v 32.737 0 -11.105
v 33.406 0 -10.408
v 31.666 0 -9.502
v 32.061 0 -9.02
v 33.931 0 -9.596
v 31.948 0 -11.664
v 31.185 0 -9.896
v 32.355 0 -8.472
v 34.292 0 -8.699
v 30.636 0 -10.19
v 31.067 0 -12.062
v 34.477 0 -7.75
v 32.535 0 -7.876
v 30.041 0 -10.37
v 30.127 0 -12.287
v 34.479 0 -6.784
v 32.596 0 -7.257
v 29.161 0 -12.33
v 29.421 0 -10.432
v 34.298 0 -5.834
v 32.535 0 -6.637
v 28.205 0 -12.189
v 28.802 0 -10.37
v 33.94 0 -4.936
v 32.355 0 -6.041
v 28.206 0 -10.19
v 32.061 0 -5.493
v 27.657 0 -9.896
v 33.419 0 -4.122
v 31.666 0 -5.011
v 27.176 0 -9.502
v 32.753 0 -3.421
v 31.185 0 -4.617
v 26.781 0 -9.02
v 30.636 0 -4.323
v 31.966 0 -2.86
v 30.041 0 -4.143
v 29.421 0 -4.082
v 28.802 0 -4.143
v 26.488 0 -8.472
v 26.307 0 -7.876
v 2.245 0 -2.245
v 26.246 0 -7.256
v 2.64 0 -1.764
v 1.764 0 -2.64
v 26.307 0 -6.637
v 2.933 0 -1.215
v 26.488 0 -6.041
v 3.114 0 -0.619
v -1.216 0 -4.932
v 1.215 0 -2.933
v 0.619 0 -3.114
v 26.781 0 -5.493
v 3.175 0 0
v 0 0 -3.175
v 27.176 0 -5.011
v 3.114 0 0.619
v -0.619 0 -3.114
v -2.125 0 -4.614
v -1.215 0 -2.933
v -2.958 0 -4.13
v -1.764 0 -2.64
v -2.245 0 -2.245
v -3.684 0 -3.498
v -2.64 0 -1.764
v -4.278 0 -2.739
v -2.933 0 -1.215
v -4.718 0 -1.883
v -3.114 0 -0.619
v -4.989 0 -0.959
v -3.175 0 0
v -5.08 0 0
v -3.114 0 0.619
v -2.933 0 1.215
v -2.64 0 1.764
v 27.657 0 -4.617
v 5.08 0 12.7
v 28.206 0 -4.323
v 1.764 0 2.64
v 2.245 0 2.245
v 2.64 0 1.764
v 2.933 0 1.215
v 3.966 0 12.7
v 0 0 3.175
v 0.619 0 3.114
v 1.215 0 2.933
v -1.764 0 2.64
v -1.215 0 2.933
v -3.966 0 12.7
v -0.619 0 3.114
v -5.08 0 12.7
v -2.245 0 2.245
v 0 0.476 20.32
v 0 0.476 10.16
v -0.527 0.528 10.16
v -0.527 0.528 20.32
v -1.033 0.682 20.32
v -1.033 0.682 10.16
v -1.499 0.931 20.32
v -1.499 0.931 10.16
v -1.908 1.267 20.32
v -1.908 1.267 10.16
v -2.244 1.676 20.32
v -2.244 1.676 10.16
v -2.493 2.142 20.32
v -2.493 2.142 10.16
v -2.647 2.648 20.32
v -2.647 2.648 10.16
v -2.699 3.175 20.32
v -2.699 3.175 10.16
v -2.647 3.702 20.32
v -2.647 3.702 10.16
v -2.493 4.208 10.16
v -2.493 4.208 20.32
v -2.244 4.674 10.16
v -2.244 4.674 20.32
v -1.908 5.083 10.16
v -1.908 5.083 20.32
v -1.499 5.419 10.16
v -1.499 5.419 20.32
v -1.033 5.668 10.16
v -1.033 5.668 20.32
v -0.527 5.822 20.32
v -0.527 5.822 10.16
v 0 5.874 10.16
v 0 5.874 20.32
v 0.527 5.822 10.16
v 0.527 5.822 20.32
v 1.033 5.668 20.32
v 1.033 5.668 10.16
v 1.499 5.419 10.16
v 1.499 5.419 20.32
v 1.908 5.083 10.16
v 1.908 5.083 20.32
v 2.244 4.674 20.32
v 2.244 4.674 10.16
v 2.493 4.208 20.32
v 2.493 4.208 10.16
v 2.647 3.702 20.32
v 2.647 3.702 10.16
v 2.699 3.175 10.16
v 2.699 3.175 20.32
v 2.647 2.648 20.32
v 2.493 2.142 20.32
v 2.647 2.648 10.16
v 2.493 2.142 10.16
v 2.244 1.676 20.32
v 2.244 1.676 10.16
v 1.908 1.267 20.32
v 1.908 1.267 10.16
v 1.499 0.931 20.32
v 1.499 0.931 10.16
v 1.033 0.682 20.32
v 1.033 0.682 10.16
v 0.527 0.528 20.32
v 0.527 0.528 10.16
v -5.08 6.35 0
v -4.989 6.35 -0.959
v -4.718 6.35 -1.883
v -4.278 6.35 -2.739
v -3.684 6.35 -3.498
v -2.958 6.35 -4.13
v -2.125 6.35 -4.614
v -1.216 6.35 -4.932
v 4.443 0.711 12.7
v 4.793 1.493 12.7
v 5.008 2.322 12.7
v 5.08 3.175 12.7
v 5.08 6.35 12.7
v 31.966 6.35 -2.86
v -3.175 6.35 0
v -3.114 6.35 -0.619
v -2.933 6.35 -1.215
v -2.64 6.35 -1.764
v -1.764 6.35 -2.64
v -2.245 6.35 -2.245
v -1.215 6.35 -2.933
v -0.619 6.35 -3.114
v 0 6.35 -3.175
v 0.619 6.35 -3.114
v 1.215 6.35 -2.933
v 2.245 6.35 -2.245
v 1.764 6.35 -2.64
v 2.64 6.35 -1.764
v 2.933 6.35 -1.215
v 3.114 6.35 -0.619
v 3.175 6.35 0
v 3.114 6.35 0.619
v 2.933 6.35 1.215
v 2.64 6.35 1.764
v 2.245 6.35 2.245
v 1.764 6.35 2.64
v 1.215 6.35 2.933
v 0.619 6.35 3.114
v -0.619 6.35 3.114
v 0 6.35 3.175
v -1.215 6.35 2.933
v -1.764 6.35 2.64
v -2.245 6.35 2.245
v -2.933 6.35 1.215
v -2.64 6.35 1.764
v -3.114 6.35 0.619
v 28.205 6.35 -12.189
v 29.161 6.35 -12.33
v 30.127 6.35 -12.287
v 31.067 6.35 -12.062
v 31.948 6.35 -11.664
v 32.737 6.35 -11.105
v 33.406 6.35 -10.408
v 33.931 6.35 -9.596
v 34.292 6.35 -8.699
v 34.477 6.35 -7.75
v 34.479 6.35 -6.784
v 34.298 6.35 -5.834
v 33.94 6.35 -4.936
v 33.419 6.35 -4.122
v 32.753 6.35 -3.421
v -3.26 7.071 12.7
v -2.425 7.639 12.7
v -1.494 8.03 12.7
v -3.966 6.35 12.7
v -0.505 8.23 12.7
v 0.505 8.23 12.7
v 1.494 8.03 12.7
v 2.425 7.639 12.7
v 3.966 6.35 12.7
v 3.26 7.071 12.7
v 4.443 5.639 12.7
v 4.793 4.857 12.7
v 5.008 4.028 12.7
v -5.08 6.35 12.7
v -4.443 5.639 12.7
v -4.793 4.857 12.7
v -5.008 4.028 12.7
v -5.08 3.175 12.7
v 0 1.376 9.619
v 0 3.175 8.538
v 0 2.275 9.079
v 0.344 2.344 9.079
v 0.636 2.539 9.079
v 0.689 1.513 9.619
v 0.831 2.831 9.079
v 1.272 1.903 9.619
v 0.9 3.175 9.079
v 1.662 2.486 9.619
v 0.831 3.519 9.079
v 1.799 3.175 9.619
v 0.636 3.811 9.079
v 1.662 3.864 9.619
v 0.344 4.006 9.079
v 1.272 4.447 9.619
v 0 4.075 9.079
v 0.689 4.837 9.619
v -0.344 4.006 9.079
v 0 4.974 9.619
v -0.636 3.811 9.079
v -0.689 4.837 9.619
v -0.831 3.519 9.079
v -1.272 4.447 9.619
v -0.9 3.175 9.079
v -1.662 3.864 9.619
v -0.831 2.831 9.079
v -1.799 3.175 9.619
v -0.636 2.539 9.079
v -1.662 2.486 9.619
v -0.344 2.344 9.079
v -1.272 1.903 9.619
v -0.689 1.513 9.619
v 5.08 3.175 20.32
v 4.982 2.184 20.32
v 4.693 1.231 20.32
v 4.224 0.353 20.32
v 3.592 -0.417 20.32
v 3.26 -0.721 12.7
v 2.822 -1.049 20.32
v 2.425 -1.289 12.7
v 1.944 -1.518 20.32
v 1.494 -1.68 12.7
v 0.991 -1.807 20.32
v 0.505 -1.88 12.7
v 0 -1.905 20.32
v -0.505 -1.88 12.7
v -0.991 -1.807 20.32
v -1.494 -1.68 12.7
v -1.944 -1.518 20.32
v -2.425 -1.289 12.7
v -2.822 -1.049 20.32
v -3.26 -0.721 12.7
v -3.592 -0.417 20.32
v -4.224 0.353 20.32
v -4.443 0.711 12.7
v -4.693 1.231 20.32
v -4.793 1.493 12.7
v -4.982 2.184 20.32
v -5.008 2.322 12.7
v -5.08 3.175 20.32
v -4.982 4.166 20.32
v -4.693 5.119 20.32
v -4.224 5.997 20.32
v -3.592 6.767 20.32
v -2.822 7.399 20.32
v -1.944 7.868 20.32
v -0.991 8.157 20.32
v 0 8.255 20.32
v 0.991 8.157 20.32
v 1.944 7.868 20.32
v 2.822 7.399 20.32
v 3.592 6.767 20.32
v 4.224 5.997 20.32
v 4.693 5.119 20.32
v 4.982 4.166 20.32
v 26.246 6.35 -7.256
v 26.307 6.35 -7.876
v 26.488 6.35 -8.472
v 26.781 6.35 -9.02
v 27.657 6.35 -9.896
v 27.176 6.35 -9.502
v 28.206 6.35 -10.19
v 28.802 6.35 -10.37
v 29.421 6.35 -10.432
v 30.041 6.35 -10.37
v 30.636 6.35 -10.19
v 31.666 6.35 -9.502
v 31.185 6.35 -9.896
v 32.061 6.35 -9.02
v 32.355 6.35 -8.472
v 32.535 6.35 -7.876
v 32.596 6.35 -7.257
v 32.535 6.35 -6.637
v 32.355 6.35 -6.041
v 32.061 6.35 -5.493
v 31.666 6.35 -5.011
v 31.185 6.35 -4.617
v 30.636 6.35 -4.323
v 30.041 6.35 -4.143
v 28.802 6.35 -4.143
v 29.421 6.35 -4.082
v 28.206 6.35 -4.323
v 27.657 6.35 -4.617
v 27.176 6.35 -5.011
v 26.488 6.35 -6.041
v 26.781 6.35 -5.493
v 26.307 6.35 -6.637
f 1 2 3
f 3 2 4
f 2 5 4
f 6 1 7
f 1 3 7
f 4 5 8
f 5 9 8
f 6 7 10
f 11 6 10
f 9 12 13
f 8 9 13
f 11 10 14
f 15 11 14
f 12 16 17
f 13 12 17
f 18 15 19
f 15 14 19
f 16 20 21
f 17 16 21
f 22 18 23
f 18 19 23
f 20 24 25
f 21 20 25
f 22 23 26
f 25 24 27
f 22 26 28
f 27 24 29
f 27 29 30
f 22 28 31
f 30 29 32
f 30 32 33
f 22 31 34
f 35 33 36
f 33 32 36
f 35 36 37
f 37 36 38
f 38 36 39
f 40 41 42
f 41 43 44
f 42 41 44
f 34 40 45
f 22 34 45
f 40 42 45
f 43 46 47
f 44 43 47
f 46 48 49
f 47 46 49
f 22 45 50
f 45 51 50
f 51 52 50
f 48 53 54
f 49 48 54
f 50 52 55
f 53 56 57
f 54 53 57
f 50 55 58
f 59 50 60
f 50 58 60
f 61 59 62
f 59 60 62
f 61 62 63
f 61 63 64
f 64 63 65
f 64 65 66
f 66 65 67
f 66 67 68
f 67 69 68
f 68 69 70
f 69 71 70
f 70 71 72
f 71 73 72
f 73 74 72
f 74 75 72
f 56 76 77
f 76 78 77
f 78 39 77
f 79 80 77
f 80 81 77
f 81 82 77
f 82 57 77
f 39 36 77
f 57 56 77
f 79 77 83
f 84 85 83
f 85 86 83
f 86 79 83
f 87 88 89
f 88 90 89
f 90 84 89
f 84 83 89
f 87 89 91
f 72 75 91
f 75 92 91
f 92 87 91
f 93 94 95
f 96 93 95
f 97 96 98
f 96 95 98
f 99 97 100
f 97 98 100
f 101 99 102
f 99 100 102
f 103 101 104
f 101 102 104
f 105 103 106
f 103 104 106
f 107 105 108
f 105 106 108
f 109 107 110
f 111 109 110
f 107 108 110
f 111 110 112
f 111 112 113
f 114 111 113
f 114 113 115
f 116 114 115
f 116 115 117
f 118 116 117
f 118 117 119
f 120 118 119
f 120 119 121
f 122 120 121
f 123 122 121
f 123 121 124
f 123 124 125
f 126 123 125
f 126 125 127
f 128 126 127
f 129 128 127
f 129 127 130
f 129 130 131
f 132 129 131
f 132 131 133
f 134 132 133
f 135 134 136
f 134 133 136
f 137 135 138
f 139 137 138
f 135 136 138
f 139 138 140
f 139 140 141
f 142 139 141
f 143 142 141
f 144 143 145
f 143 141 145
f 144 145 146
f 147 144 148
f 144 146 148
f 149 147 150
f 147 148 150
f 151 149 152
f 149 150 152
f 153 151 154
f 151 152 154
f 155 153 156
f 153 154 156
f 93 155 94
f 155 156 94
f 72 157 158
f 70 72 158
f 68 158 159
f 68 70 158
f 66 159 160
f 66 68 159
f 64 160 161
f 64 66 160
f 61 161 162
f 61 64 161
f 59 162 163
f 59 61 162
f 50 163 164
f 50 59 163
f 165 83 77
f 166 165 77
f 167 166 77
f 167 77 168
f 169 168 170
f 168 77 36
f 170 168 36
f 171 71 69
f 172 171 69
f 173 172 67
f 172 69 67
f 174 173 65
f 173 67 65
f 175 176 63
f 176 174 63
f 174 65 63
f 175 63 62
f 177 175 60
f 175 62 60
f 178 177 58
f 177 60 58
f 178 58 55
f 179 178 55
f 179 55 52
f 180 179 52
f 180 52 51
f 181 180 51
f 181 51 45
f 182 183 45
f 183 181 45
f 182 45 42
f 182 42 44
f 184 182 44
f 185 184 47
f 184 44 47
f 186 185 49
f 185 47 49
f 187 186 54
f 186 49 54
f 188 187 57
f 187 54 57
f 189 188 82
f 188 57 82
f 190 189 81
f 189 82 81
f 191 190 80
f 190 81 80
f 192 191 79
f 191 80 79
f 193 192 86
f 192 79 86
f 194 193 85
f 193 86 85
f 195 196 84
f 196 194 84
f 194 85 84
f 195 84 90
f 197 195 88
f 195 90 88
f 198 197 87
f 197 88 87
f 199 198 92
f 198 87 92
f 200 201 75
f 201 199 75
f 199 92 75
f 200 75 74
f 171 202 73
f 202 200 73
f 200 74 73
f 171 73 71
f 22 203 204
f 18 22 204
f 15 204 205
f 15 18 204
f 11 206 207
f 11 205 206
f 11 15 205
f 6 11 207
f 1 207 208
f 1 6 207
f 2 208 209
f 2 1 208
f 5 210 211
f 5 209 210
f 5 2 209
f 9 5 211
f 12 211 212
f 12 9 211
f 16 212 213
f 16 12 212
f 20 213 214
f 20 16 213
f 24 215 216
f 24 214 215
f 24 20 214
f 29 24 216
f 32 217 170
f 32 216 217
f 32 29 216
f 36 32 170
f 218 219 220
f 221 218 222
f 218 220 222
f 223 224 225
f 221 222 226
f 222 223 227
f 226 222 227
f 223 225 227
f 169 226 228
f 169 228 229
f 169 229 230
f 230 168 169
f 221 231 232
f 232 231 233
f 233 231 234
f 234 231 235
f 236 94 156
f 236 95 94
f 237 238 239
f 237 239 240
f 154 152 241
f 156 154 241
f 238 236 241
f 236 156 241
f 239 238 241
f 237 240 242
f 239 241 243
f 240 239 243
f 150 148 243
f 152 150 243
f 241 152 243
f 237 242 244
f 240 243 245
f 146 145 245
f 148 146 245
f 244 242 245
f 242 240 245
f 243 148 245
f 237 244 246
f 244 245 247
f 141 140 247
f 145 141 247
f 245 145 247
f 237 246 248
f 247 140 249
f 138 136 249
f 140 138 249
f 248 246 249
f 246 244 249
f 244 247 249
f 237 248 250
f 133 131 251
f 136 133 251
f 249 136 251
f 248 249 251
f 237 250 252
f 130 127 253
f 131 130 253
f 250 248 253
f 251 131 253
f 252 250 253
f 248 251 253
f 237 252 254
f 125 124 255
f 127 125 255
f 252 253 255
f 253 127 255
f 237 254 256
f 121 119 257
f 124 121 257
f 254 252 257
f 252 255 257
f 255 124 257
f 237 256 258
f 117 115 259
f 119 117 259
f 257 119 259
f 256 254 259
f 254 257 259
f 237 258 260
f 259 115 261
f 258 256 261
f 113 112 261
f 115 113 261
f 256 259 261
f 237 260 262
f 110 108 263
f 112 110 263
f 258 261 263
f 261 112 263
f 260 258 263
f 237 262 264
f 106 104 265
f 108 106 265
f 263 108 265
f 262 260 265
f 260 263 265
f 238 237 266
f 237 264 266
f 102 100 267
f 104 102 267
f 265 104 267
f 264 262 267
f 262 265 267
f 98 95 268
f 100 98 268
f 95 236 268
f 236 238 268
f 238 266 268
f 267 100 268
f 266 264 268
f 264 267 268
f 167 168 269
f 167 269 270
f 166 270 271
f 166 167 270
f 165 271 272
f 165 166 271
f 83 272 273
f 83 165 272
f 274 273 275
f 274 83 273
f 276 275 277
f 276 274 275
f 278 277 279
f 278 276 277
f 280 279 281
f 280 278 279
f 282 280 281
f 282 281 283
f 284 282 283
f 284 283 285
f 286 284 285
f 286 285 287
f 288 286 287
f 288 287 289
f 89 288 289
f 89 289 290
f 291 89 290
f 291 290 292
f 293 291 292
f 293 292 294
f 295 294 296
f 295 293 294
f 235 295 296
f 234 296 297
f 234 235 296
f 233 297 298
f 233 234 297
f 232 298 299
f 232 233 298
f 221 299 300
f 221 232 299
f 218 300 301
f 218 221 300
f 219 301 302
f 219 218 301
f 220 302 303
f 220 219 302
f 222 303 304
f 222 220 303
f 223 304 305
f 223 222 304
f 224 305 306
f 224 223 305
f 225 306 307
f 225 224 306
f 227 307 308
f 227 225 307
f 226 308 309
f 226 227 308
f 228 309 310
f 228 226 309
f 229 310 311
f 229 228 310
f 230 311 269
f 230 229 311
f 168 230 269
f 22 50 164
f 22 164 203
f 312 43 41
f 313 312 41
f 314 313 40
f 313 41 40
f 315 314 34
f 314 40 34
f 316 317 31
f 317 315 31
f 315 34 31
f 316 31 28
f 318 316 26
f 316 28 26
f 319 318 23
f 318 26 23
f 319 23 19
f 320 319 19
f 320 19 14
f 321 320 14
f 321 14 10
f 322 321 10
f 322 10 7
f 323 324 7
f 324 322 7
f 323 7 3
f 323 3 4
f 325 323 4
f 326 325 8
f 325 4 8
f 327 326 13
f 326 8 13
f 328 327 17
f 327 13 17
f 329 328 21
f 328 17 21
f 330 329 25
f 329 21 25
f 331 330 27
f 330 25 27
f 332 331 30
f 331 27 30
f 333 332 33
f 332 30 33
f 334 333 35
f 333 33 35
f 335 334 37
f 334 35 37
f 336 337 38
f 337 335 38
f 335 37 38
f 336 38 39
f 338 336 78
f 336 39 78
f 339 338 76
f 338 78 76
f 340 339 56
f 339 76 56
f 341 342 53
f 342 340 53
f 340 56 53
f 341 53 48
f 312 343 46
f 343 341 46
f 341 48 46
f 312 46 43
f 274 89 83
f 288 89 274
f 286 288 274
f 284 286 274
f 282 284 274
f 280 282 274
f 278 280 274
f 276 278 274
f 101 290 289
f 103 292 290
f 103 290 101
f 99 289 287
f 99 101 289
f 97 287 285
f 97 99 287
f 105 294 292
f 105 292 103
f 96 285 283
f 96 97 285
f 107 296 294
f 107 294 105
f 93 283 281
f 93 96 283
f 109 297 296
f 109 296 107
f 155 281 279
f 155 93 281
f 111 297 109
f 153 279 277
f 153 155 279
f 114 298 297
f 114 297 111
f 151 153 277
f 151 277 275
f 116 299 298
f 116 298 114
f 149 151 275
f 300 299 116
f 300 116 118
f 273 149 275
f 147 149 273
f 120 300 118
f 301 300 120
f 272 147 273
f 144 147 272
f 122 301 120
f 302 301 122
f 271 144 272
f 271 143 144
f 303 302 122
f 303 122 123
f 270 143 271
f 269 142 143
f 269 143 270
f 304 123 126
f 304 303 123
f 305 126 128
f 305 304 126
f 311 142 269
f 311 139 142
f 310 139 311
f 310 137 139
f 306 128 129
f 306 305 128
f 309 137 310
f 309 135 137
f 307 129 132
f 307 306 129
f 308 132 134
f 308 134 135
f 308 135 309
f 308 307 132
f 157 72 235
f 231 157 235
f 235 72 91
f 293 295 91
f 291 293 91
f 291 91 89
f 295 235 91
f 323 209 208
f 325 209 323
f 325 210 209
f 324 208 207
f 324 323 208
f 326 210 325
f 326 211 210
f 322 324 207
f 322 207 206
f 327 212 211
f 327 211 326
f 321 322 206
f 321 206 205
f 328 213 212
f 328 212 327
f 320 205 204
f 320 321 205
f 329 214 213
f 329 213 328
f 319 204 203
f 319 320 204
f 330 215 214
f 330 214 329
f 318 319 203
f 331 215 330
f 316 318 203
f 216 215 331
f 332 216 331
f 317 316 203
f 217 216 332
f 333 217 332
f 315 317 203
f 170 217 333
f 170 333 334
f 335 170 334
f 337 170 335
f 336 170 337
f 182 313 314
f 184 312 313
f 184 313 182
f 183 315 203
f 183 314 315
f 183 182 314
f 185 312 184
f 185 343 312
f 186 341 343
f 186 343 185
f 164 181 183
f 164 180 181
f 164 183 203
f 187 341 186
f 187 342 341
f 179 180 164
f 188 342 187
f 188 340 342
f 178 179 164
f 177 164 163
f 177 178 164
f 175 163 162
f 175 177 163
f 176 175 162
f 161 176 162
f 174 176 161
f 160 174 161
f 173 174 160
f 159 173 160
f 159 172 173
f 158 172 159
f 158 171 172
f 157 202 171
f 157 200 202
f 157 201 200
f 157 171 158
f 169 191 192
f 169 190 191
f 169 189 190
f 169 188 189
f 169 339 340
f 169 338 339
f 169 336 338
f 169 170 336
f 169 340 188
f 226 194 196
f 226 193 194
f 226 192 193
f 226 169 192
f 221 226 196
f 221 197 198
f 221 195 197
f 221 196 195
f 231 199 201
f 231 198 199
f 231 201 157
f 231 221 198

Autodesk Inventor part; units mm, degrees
ref_plane "YZ Plane" through (0, 0, 0) normal (1, 0, 0) x (0, 1, 0)
ref_plane "XZ Plane" through (0, 0, 0) normal (0, 1, 0) x (-1, 0, 0)
ref_plane "XY Plane" through (0, 0, 0) normal (0, 0, 1) x (1, 0, 0)
sketch "Sketch1" plane through (0, 0, 0) normal (0, 1, 0) x (-1, 0, 0)
  circle A0 centre (0, 0) radius 3.175
  arc A1 (1.2165, -4.9322) -> (5.08, 0) centre (0, 0) ccw
  line L0 (5.08, 0) -> (5.08, 12.7)
  line L1 (0, 0) -> (-5.08, 0) construction
  line L2 (-5.08, 0) -> (-29.4214, -7.2565) construction
  line L3 (-5.08, 0) -> (20.32, 0) construction
  arc A2 (-31.9659, -2.8597) -> (-28.2049, -12.1887) centre (-29.4214, -7.2565) ccw
  circle A3 centre (-29.4214, -7.2565) radius 3.175
  line L4 (5.08, 12.7) -> (-5.08, 12.7)
  line L5 (-5.08, 12.7) -> (-31.9659, -2.8597)
  line L6 (1.2165, -4.9322) -> (-28.2049, -12.1887)
  dimension "d0" = 6.35
  dimension "d1" = 10.16
  dimension "d2" = 12.7
  dimension "d3" = 25.4
  dimension "d4" = 163.4
  dimension "d5" = 10.16
  dimension "d6" = 6.35
  dimension "d7" = 10.16
extrude "Extrusion1" add sketch "Sketch1" along normal blind 6.35
sketch "Sketch2" plane through (-5.08, 0, 12.7) normal (0, 0, 1) x (1, 0, 0)
  line L0 (5.08, 0) -> (5.08, 6.35) construction
  line L1 (0, 6.35) -> (10.16, 6.35) construction
  circle A0 centre (5.08, 3.175) radius 5.08
  dimension "d10" = 10.16
extrude "Extrusion2" add sketch "Sketch2" along normal blind 7.62
sketch "Sketch4" plane through (0, 3.175, 20.32) normal (0, 0, 1) x (1, 0, 0)
  point P0 (0, -3.175)
  point P1 (0, 0)
hole "Hole1" at (0, 3.175, 20.32) direction (0, 0, -1) diameter 5.3975 depth 10.16 tip angle 118
properties part number "StteringArm"
